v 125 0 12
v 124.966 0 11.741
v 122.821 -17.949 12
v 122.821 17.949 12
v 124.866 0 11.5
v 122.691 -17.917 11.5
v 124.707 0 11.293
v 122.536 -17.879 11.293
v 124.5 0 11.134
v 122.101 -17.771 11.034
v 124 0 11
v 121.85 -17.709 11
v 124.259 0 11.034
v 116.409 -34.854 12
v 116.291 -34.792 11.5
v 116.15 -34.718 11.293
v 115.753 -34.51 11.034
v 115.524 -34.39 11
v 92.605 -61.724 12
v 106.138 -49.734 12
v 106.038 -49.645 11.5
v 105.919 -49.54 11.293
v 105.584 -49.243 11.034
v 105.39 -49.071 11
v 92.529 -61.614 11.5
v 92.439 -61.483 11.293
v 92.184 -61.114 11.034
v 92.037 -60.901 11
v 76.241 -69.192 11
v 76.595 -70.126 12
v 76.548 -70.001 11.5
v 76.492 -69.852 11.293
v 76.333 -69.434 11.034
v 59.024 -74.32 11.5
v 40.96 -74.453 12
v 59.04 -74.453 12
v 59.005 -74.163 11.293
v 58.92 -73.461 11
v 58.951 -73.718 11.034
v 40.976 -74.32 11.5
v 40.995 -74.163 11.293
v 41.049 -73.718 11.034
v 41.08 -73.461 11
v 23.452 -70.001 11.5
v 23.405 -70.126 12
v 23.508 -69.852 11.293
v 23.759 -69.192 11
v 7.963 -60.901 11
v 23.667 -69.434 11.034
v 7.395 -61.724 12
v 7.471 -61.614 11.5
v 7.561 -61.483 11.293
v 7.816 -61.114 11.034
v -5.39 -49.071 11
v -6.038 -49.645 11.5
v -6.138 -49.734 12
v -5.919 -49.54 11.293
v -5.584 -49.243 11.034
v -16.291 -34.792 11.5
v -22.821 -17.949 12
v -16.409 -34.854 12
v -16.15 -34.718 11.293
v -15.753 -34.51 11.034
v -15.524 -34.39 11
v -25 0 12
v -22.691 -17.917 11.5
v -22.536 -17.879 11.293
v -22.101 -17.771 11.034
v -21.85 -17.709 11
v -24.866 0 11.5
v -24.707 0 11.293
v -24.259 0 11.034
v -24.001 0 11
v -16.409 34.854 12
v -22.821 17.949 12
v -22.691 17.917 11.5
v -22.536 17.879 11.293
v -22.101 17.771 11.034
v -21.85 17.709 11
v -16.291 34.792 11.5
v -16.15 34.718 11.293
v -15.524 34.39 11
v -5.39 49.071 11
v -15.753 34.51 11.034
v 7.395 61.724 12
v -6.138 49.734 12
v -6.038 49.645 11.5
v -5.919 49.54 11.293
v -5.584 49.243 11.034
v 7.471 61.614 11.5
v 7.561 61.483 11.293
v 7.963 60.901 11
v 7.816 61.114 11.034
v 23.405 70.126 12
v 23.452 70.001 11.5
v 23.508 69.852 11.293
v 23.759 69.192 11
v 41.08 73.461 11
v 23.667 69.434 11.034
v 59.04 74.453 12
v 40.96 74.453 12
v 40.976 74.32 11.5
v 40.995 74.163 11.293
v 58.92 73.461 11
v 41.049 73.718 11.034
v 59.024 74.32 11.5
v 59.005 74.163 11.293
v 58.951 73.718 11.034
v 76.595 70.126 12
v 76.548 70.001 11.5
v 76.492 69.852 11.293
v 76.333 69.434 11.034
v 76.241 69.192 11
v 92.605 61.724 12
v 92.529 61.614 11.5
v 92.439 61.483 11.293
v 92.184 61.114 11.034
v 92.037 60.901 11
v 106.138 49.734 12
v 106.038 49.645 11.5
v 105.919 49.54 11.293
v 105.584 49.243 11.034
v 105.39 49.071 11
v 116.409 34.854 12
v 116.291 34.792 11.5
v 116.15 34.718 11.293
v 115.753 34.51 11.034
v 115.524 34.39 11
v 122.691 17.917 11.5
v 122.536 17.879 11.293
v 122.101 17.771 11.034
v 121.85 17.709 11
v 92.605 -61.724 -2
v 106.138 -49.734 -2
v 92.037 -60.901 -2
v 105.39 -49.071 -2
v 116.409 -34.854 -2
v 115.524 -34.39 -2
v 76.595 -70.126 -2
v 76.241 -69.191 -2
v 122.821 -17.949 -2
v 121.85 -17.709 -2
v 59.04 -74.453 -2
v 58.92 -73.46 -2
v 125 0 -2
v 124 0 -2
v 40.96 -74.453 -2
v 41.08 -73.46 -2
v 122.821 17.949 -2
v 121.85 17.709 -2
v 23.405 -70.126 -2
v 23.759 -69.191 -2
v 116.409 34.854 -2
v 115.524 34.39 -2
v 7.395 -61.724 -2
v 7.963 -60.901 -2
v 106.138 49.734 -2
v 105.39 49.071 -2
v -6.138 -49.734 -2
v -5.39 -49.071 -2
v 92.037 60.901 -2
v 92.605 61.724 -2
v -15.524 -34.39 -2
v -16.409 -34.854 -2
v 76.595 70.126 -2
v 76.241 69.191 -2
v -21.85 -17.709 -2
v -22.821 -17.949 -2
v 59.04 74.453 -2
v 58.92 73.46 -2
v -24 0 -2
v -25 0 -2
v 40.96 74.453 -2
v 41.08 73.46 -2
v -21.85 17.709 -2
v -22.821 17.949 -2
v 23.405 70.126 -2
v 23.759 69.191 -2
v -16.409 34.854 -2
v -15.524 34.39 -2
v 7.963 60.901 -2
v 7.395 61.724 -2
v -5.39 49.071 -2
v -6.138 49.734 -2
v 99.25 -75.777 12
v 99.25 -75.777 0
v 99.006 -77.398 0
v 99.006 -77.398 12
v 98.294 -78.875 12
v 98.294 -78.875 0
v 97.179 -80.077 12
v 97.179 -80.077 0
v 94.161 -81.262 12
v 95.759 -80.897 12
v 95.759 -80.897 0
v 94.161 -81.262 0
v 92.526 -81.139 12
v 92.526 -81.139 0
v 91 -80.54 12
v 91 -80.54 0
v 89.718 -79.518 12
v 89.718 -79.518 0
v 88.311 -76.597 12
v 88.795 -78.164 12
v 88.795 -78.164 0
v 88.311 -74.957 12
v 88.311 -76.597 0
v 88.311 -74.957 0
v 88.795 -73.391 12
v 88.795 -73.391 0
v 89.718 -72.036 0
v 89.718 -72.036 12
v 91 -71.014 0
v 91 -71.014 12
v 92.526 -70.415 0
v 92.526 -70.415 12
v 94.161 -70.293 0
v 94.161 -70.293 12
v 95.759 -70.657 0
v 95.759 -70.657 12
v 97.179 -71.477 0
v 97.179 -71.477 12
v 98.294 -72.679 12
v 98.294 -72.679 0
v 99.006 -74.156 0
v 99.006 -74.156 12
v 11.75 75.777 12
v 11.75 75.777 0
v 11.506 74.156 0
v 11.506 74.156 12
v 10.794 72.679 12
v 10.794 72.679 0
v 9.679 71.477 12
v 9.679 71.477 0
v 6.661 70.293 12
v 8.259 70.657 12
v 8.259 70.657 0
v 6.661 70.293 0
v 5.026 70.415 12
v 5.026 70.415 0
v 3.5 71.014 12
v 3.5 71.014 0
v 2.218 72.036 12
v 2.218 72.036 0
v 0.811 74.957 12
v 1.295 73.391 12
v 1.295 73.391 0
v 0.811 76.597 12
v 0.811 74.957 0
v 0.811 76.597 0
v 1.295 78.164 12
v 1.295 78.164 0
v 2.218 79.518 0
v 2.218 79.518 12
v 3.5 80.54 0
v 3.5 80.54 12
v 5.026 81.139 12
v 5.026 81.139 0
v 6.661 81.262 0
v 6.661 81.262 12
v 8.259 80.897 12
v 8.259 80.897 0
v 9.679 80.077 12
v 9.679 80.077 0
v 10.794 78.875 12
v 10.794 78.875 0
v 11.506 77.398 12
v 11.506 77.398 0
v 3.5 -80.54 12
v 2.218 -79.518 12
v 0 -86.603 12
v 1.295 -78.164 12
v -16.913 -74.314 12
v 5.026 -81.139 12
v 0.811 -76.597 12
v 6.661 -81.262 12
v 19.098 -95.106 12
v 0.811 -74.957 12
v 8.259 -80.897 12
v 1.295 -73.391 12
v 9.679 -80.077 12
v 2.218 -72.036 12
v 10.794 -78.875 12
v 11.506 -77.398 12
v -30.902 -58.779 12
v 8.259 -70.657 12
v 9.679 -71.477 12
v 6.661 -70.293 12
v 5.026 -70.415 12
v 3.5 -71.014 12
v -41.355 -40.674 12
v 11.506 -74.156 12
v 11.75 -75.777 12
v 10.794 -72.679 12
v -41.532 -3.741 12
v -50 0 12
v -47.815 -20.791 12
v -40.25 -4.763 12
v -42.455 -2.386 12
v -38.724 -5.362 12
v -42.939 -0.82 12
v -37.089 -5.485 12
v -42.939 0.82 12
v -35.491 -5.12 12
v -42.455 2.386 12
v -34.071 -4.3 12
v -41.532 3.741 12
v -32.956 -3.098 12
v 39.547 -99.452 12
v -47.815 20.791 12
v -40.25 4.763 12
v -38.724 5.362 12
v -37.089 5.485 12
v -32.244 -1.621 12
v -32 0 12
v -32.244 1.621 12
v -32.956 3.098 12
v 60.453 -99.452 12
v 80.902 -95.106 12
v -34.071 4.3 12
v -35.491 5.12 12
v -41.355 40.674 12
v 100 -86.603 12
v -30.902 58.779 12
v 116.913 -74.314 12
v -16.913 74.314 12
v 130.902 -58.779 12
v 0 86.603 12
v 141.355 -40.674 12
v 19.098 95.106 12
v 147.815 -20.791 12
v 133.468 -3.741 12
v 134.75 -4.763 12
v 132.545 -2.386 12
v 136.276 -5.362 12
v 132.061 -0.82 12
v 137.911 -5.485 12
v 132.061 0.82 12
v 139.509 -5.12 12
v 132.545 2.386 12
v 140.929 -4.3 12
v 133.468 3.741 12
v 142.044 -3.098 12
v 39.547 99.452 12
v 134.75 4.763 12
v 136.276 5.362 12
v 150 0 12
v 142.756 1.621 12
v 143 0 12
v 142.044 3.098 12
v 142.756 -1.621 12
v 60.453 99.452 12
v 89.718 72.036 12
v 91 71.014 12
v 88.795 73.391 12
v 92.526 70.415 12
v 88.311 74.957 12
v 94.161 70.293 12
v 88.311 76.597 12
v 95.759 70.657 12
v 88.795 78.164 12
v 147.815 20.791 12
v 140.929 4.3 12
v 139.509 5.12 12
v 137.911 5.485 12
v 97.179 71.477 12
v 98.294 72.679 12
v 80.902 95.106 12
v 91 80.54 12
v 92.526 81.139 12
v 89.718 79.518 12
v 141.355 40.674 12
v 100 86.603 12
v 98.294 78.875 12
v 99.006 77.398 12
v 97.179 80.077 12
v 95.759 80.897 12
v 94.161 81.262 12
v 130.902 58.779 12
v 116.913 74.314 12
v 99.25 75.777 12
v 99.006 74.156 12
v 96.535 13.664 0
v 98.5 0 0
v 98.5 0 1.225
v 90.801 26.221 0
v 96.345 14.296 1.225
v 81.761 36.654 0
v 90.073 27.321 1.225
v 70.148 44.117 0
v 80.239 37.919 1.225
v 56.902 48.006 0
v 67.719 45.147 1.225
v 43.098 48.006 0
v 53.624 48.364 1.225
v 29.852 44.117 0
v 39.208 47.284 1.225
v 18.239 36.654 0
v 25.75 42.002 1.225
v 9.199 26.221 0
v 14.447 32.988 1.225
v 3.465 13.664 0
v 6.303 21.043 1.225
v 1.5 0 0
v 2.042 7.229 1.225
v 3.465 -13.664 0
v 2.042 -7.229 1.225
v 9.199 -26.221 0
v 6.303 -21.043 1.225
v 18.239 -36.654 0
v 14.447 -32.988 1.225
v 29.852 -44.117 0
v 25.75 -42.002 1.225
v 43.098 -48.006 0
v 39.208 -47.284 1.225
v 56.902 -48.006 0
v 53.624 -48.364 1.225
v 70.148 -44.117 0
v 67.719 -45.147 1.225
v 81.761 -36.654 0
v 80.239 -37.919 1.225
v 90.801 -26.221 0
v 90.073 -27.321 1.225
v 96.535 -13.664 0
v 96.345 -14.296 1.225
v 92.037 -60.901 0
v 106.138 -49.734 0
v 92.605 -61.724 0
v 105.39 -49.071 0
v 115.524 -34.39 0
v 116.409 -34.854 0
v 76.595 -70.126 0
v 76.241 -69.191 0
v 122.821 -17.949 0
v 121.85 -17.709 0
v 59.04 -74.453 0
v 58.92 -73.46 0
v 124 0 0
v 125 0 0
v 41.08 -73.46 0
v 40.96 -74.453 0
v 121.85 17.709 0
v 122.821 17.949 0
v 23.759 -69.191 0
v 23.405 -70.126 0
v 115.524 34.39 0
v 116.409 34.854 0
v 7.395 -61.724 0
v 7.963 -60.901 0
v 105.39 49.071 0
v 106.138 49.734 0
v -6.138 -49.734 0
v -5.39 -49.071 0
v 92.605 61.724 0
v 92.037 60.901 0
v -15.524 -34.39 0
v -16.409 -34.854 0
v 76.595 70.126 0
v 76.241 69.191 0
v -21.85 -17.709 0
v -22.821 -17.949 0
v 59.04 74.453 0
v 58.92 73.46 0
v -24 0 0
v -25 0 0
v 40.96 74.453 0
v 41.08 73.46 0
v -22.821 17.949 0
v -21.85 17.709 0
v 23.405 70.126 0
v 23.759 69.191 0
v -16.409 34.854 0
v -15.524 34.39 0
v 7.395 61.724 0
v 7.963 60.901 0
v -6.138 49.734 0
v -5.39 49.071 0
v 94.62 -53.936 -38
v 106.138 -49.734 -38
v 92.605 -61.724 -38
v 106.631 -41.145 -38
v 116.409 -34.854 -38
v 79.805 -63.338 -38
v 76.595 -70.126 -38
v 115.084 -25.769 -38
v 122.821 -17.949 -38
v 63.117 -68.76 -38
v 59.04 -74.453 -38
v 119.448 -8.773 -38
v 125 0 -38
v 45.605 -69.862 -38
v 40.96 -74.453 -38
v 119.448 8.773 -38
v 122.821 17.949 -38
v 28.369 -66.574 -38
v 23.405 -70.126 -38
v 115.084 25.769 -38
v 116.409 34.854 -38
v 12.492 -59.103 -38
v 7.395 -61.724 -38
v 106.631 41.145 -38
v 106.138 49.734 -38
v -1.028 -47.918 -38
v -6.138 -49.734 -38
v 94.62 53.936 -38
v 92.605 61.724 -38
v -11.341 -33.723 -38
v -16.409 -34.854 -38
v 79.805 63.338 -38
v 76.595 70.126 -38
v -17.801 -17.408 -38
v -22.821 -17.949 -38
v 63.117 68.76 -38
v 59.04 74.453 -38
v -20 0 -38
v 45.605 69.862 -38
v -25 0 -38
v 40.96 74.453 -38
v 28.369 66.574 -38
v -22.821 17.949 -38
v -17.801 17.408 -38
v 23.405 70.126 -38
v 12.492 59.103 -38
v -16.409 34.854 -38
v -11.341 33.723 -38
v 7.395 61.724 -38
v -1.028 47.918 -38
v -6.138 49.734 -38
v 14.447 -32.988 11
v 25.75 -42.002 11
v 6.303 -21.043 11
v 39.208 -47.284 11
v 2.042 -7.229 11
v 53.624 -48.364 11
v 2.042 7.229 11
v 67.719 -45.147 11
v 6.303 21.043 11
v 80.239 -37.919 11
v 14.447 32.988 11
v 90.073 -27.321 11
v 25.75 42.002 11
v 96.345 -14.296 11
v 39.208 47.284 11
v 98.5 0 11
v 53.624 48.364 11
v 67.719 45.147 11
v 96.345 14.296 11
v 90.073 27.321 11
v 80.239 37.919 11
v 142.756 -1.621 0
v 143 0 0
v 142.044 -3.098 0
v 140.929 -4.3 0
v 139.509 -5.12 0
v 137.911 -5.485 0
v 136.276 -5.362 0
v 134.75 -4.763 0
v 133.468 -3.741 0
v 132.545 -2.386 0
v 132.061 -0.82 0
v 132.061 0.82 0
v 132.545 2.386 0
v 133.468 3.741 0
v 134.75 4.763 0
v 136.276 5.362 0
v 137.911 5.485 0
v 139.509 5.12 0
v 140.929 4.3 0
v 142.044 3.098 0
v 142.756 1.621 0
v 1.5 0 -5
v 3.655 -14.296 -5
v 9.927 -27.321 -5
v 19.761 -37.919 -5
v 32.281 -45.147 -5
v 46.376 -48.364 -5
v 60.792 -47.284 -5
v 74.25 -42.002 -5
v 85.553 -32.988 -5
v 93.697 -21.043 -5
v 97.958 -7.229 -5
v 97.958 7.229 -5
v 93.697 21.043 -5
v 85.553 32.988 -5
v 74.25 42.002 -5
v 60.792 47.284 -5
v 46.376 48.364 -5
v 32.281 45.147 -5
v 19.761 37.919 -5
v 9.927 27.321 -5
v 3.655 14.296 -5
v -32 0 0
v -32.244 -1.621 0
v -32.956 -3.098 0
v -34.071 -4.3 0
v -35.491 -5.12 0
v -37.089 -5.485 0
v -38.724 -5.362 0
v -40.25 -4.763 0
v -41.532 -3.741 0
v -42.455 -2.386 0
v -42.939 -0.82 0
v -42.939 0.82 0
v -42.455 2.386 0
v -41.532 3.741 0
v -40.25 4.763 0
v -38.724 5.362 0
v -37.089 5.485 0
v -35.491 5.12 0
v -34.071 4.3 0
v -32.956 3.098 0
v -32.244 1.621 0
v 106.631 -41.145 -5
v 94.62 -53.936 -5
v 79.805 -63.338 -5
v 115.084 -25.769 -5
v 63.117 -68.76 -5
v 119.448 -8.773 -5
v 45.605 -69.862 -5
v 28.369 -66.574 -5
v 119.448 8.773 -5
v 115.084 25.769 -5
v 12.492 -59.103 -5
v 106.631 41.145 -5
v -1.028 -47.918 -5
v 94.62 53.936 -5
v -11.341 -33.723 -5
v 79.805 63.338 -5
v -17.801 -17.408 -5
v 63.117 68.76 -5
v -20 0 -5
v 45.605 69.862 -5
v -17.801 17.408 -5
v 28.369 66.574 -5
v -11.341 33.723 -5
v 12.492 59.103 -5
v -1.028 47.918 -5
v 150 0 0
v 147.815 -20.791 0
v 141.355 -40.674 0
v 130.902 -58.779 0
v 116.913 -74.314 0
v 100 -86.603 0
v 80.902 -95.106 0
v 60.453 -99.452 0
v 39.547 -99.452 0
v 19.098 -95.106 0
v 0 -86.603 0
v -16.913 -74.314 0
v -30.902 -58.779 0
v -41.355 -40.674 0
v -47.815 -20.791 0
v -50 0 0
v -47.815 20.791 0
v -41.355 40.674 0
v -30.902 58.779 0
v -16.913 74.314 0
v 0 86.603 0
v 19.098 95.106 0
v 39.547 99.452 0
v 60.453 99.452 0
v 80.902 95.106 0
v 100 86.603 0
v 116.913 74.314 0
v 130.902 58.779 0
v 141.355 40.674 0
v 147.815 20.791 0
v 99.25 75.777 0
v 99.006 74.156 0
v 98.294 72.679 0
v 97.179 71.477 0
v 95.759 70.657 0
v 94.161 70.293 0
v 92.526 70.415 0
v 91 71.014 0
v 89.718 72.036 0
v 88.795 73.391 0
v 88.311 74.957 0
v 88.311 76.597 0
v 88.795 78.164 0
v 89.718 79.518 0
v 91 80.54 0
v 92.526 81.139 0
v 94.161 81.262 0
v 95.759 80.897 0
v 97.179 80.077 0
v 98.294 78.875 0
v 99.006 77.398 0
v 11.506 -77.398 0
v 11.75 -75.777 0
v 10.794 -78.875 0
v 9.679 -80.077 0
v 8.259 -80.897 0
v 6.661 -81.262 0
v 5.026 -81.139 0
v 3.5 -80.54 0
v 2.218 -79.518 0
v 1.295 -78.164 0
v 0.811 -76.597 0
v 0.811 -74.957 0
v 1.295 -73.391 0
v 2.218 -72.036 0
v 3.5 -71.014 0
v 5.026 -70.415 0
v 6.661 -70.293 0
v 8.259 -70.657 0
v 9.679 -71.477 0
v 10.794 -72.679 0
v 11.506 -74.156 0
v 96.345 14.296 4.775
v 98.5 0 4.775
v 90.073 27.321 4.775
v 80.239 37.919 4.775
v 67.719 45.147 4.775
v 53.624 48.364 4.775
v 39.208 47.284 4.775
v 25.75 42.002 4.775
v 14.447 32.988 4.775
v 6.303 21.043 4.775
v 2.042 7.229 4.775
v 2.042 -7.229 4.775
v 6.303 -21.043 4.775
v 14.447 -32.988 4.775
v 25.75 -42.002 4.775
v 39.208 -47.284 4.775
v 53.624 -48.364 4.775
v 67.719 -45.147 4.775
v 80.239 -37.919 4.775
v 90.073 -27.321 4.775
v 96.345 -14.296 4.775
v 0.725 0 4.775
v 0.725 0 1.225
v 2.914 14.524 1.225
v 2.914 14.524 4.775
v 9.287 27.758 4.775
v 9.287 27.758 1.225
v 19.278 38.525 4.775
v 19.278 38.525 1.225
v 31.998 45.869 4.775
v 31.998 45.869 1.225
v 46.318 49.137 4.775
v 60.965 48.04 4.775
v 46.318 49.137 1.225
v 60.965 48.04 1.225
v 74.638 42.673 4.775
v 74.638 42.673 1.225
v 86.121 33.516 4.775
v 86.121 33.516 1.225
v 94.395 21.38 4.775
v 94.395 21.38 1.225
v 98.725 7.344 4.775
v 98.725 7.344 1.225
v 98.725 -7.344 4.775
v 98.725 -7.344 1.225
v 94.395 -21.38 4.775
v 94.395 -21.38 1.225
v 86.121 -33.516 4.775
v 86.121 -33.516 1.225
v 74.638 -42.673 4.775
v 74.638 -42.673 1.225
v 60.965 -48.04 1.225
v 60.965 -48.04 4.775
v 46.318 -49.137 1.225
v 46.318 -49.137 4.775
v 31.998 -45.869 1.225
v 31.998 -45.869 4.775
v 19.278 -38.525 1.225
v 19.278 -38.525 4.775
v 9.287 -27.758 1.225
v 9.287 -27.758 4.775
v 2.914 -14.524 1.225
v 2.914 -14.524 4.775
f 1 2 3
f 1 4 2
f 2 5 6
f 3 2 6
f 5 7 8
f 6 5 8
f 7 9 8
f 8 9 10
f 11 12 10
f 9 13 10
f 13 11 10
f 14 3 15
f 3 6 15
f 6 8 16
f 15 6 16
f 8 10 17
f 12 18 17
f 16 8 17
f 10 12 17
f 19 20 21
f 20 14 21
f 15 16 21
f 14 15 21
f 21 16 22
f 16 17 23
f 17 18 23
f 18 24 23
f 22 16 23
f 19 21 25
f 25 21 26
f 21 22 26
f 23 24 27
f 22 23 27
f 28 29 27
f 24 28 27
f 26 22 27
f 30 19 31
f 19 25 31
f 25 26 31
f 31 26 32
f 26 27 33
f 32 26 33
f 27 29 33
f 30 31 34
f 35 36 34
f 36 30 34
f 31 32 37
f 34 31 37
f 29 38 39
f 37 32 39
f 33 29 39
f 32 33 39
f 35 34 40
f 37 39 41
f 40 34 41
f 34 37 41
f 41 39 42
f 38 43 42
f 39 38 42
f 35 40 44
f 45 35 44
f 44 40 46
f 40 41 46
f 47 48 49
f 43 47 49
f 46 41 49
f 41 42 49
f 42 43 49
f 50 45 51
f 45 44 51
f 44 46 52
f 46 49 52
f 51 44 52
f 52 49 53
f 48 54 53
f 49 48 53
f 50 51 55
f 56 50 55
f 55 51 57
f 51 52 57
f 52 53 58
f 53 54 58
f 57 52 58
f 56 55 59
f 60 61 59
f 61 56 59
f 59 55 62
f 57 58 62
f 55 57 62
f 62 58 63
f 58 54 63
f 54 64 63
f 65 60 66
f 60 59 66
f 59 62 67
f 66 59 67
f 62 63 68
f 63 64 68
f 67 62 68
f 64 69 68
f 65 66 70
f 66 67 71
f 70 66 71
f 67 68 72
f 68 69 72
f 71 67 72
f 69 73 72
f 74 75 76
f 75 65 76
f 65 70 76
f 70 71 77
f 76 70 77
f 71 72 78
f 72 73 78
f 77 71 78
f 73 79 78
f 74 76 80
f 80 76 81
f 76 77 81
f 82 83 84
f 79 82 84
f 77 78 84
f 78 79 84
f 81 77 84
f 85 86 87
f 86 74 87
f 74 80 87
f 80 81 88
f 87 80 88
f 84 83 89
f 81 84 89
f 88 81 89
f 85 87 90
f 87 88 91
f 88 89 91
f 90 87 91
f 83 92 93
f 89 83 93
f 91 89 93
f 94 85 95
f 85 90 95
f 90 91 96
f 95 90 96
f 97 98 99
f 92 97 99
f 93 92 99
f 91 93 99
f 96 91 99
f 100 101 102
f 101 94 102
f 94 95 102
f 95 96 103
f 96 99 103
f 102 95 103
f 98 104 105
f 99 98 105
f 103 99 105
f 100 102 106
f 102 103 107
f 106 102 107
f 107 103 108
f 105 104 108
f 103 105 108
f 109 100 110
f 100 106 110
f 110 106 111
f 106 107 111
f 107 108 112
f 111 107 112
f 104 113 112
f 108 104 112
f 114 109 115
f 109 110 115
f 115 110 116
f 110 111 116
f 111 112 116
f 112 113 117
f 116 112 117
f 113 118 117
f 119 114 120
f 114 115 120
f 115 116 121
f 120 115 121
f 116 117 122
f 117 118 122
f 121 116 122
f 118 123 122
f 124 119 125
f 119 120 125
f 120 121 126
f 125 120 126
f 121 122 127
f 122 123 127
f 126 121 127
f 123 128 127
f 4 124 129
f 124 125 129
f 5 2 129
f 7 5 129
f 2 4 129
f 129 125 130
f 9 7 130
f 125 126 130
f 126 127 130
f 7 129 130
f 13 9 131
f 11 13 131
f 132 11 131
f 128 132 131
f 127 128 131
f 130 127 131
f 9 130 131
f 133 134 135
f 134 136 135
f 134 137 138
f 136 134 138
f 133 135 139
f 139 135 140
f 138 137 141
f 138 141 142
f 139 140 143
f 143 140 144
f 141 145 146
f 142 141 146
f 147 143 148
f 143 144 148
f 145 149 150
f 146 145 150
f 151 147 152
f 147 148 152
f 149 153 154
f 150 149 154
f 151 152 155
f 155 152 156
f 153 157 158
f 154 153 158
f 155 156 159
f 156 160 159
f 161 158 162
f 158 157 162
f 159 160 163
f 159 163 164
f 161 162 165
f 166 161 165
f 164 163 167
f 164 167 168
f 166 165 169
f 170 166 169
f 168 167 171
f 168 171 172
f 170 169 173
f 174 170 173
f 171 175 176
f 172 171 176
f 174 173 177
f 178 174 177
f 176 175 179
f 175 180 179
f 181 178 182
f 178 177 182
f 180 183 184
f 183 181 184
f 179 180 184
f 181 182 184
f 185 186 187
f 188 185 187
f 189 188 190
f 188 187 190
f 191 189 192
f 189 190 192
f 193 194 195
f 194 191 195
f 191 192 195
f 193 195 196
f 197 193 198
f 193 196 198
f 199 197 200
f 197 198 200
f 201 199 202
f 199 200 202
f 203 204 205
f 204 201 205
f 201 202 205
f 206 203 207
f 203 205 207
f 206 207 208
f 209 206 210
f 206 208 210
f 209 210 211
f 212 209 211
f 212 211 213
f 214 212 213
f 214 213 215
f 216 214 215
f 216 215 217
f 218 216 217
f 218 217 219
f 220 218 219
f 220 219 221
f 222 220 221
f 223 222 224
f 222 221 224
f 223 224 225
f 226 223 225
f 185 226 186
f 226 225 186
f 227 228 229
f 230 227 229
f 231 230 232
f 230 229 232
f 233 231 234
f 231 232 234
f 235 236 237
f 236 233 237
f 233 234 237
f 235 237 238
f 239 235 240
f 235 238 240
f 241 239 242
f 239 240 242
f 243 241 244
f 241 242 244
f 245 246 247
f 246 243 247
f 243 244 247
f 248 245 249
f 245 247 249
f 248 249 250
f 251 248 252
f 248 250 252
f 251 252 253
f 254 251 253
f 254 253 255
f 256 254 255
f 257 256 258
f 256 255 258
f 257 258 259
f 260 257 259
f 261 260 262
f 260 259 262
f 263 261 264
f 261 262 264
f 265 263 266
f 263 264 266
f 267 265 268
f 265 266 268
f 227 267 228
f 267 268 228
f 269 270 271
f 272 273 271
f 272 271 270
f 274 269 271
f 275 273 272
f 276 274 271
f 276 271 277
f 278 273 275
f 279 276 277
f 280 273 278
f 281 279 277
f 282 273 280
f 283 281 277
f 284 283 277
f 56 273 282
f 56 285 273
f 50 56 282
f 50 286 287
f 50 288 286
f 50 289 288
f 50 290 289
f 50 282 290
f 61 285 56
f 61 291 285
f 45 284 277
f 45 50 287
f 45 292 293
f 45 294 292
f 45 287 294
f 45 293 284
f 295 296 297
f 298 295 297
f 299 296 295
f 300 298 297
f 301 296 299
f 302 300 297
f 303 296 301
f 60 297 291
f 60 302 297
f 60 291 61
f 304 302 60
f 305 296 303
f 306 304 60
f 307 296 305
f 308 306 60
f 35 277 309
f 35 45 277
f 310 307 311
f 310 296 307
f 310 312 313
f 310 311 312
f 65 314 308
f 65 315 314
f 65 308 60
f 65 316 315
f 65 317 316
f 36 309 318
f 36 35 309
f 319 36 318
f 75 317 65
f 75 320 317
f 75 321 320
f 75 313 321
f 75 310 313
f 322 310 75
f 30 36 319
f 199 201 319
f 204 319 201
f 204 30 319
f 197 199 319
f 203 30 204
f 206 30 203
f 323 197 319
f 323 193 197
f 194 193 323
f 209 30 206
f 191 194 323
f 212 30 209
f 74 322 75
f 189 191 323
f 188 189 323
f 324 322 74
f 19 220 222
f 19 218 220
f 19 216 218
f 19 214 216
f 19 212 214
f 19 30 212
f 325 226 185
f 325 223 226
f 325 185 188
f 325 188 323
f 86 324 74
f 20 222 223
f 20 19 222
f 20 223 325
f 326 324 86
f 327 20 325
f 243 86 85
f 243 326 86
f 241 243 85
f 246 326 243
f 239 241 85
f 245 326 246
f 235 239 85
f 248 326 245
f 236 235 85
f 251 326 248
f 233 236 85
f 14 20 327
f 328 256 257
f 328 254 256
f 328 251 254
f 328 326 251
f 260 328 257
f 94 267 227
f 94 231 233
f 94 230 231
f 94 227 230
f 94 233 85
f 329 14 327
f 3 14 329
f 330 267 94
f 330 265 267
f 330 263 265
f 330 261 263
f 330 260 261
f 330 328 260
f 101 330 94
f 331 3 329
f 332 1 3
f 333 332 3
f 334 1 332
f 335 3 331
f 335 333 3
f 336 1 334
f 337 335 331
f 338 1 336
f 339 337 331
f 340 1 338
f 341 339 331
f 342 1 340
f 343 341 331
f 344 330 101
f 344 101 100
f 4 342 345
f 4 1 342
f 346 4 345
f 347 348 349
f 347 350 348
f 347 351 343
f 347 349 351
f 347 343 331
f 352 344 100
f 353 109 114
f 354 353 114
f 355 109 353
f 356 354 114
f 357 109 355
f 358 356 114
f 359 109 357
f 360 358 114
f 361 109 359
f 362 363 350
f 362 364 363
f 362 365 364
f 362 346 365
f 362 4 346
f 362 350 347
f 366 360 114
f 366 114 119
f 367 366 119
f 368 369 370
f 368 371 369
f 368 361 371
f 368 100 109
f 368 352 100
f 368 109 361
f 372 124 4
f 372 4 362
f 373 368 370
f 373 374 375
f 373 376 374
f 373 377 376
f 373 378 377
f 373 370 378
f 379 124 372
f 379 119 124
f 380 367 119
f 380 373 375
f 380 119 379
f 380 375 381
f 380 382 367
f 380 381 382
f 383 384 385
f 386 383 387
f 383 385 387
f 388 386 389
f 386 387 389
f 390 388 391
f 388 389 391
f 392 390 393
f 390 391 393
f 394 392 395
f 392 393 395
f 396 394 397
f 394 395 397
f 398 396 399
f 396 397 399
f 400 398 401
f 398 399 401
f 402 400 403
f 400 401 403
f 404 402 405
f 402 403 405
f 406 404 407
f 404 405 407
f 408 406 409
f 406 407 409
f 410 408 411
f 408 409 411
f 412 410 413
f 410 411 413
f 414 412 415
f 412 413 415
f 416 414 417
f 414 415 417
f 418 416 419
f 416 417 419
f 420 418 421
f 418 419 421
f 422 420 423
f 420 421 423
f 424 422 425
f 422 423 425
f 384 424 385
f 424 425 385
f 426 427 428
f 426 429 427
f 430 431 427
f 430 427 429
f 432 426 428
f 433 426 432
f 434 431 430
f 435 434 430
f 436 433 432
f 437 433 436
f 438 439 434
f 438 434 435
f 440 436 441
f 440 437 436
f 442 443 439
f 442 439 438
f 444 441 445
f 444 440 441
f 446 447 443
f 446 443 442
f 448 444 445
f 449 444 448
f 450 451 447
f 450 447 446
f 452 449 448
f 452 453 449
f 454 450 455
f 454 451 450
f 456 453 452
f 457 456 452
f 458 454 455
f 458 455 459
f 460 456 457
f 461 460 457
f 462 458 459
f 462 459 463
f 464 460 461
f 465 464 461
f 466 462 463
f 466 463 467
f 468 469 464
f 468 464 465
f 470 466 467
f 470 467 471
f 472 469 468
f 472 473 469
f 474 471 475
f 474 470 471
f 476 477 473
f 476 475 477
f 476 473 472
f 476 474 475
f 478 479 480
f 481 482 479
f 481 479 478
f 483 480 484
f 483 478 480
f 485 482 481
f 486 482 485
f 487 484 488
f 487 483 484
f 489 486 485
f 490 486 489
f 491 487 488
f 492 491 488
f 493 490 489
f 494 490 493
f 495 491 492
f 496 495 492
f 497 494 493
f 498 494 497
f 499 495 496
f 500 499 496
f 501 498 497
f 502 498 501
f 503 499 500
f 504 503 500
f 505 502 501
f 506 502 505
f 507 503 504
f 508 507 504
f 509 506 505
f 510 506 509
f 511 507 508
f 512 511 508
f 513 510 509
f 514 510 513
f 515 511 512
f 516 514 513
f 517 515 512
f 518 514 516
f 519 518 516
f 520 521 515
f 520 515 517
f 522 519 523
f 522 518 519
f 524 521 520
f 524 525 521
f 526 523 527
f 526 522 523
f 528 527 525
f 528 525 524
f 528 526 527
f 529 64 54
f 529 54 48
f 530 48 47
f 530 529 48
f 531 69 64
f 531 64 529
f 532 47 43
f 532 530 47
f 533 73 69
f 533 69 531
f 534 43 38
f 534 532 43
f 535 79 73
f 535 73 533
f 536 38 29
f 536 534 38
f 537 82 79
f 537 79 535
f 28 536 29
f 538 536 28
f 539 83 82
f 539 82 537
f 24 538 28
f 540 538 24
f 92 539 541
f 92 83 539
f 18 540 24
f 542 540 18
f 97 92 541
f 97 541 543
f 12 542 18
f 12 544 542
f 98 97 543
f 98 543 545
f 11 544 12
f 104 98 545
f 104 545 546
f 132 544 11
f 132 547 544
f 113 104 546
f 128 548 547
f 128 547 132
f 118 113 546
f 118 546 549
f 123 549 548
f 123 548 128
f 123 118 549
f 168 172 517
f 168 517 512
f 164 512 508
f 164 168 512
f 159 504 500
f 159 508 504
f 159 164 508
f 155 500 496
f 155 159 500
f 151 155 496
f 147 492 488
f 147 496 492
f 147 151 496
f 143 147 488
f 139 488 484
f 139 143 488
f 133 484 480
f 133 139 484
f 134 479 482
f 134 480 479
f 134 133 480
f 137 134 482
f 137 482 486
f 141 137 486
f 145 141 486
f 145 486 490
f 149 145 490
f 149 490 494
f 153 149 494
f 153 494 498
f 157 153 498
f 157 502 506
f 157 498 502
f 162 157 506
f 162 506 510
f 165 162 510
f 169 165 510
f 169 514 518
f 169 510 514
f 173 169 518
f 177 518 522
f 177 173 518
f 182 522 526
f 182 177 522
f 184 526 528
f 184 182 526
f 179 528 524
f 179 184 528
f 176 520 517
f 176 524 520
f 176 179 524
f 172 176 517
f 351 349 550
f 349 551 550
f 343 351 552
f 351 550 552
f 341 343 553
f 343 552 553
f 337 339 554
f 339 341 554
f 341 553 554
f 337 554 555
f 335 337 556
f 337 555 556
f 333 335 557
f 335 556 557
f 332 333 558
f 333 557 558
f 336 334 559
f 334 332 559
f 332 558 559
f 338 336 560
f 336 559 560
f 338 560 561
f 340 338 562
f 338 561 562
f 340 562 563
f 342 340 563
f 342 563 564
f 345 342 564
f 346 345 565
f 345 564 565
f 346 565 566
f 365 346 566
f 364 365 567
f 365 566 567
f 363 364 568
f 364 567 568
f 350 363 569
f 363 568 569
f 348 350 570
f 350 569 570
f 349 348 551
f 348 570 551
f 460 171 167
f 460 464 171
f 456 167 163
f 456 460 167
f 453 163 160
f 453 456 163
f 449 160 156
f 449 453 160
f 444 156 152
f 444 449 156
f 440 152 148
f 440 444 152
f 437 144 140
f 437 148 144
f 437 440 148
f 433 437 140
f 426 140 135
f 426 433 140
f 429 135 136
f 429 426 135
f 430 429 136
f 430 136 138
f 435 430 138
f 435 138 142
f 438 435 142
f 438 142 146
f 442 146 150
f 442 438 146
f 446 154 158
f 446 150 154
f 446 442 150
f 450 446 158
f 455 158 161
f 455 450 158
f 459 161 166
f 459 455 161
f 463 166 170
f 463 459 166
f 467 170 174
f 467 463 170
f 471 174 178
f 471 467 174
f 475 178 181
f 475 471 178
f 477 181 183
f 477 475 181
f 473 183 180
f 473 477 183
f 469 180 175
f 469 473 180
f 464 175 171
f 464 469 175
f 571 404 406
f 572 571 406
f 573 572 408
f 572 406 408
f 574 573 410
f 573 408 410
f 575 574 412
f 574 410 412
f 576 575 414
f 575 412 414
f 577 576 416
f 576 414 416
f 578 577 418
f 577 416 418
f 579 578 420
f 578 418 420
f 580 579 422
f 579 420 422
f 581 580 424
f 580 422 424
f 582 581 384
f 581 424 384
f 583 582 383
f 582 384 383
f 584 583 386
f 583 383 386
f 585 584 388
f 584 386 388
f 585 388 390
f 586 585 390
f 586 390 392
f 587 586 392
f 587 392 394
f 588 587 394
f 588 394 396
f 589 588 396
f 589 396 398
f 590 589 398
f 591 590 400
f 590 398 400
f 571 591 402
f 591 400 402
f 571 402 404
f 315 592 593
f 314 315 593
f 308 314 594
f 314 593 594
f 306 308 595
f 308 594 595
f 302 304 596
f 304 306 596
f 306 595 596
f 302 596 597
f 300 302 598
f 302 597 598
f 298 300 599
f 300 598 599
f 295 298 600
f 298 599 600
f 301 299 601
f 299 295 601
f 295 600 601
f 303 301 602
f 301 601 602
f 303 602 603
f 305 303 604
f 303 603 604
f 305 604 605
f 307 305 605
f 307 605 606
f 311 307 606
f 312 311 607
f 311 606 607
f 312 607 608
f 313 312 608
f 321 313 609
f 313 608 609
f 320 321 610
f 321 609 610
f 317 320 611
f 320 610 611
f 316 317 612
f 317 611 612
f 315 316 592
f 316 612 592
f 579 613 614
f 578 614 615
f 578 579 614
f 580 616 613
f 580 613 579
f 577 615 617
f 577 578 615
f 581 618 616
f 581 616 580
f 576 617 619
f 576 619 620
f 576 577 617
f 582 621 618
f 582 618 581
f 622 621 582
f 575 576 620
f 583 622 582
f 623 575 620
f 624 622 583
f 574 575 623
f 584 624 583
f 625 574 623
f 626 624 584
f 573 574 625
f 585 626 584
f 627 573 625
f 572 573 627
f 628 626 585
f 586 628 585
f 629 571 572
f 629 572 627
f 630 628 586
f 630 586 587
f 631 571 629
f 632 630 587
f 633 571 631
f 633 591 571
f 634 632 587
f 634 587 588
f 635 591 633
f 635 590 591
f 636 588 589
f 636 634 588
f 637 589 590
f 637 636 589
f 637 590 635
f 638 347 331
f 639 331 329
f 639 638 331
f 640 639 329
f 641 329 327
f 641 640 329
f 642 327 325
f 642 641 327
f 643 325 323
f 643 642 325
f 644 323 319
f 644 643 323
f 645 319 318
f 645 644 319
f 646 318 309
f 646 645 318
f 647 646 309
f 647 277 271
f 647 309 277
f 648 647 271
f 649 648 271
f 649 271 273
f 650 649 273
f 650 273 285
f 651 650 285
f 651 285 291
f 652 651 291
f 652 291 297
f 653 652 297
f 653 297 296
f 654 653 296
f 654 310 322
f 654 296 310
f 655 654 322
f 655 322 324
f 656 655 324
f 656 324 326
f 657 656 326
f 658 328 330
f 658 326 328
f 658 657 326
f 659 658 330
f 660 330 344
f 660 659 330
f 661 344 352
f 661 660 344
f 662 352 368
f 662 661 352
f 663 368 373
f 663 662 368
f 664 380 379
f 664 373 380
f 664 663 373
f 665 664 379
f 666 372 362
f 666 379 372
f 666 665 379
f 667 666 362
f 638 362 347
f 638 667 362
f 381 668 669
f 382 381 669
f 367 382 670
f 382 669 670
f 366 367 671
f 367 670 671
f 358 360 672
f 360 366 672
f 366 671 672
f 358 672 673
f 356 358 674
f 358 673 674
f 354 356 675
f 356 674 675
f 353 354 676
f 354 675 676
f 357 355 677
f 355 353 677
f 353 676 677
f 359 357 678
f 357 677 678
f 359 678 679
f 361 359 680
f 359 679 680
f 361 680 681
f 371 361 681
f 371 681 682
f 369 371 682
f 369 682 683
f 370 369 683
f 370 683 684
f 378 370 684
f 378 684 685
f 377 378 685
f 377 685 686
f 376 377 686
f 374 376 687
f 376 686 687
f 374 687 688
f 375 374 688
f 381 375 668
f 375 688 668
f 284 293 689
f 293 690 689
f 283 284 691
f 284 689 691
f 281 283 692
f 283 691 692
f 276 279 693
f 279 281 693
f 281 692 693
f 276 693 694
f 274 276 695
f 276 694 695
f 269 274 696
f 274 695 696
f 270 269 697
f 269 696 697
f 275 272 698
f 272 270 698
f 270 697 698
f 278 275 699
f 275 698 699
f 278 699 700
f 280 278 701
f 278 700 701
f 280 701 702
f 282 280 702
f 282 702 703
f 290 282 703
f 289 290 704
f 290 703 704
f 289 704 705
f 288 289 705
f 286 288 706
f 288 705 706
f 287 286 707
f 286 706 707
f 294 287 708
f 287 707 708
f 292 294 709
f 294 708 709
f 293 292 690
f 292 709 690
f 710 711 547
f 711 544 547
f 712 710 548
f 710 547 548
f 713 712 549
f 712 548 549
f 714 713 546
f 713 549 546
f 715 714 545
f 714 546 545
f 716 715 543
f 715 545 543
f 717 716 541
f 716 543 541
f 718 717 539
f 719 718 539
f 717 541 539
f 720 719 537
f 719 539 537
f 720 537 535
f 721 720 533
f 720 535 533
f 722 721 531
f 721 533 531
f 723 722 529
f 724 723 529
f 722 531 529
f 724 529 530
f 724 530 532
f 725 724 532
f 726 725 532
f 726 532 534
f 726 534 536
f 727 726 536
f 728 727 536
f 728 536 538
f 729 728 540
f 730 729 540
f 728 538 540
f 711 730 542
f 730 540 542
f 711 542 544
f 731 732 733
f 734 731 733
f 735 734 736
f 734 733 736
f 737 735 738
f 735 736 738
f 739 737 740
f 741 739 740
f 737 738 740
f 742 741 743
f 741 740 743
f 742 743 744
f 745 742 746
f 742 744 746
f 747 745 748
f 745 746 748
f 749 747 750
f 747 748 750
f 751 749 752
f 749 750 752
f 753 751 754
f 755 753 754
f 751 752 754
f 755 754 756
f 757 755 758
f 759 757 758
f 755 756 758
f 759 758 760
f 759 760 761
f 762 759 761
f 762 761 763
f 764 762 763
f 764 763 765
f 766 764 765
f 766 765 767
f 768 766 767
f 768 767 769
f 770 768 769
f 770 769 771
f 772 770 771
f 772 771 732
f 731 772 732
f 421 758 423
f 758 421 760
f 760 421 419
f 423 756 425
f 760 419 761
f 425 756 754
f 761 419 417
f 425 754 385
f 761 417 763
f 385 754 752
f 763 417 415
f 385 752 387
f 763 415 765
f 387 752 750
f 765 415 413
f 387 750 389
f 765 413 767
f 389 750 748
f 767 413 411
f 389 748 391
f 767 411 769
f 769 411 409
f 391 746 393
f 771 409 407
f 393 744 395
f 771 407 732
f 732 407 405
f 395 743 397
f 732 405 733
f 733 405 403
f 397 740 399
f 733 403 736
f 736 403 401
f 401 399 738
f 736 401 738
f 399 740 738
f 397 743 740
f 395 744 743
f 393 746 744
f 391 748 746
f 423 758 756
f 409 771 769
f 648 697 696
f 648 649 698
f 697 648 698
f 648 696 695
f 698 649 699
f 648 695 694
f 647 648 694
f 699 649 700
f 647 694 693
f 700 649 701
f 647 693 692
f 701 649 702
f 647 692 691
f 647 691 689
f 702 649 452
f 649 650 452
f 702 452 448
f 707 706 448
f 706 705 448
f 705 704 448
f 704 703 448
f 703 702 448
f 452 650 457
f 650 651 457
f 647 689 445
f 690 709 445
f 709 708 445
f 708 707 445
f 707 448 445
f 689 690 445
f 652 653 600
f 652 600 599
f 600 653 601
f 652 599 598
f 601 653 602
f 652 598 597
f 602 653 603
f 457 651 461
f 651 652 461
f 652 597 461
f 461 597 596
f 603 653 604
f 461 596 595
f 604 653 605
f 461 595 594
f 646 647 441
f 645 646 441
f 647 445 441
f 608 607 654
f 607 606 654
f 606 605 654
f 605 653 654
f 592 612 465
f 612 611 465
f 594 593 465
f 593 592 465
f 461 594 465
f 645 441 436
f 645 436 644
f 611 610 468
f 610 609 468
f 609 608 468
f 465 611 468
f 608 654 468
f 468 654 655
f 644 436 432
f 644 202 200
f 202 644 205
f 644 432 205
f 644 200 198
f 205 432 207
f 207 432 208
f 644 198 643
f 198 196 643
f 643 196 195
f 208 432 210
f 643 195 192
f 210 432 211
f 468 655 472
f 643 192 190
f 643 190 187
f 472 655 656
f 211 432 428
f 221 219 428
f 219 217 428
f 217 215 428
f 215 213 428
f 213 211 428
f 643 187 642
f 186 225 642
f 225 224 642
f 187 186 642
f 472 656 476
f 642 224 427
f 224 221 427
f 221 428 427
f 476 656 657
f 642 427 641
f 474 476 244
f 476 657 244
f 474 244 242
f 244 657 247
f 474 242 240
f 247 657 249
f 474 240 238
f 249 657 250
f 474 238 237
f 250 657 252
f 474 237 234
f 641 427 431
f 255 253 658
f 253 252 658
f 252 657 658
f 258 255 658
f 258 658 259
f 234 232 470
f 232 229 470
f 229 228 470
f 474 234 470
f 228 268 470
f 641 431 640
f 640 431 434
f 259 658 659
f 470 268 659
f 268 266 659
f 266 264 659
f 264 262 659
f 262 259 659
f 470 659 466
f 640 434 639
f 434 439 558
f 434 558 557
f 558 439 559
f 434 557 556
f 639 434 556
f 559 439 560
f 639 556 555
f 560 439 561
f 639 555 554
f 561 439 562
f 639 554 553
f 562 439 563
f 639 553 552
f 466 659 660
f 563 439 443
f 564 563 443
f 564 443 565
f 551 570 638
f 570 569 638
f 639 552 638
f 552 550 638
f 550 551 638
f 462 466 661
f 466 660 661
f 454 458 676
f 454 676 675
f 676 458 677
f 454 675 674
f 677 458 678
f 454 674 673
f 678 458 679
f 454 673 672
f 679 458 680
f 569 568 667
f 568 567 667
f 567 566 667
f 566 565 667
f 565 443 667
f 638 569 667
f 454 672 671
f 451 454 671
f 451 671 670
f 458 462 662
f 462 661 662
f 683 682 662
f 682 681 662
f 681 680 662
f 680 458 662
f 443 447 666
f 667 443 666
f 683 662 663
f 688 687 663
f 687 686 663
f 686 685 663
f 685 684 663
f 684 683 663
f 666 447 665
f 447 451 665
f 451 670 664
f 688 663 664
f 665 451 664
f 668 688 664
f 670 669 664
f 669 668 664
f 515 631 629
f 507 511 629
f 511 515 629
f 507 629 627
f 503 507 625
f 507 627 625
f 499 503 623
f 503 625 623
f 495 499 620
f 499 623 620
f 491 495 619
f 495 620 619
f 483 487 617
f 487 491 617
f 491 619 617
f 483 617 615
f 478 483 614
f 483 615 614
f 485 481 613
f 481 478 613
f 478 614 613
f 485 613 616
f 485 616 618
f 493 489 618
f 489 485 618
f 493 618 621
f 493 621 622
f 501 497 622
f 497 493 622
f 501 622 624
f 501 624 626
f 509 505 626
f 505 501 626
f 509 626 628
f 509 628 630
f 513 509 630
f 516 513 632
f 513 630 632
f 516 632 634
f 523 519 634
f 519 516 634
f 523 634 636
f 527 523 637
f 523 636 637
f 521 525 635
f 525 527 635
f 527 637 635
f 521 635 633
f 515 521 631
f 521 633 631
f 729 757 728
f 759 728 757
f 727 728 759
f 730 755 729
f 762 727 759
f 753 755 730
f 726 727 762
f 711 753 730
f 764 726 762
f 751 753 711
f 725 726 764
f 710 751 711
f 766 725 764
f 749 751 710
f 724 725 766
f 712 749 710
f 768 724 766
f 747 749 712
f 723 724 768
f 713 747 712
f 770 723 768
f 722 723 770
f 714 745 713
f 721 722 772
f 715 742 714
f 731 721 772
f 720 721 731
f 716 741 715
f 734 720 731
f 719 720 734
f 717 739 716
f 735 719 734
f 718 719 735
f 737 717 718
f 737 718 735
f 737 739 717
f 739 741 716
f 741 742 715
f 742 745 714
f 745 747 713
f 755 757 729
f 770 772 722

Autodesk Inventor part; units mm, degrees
ref_plane "YZ Plane" through (0, 0, 0) normal (1, 0, 0) x (0, 1, 0)
ref_plane "工作平面1" through (0, 0, 0) normal (0, 0, 1) x (1, 0, 0)
sketch "草图1" plane through (0, 0, 0) normal (0, 0, 1) x (1, 0, 0)
  arc A0 (50, 75) -> (50, -75) centre (50, 0) ccw construction
  line L0 (50, 75) -> (50, 100) construction
  arc A1 (50, 100) -> (50, -100) centre (50, 0) ccw construction
  line L1 (50, -100) -> (50, -75) construction
  circle A2 centre (50, 0) radius 100
  circle A3 centre (50, 0) radius 87.5 construction
  line L2 (190.8101, 0) -> (-90.8101, 0) construction
  circle A4 centre (137.5, 0) radius 5.5
  circle A5 centre (93.75, 75.7772) radius 5.5
  circle A6 centre (6.25, 75.7772) radius 5.5
  circle A7 centre (-37.5, 0) radius 5.5
  circle A8 centre (6.25, -75.7772) radius 5.5
  circle A9 centre (93.75, -75.7772) radius 5.5
  point P0 (0, 0)
  dimension "d0" = 175
  dimension "d1" = 11
  dimension "d4" = 360
extrude "拉伸1" add sketch "草图1" along normal blind 12
sketch "草图2" plane through (50, 0, 12) normal (0, 0, 1) x (1, 0, 0)
  circle A0 centre (0, 0) radius 48 construction
  circle A1 centre (0, 0) radius 48.5
  point P0 (-50, 0)
  dimension "d19" = 97
extrude "拉伸2" cut sketch "草图2" against normal up to surface (12 mm away)
sketch "草图3" plane through (50, 0, 0) normal (0, 0, -1) x (-1, 0, 0)
  circle A0 centre (0, 0) radius 100 projected
  circle A1 centre (0, 0) radius 75
  circle A2 centre (0, 0) radius 70
  point P0 (50, 0)
  dimension "d11" = 150
  dimension "d12" = 140
extrude "拉伸3" add sketch "草图3" along normal blind 38 contours A1
sketch "草图4" plane through (50, 0, 12) normal (0, 0, 1) x (1, 0, 0)
  circle A0 centre (0, 0) radius 48.5 construction
  circle A1 centre (0, 0) radius 75
  point P0 (-50, 0)
  dimension "d15" = 150
extrude "拉伸4" cut sketch "草图4" against normal blind 1
fillet "圆角1" radius 1 1 edges at (-25, 0, 11)
sketch "草图5" plane through (50, 0, 0) normal (0, 0, -1) x (-1, 0, 0)
  circle A0 centre (0, 0) radius 70 projected
  circle A1 centre (0, 0) radius 48.5 projected
  point P0 (50, 0)
extrude "拉伸5" add sketch "草图5" along normal blind 5
ref_plane "工作平面2" through (50, 0, 3) normal (0, 0, -1) x (-1, 0, 0)
sketch "草图6" plane through (50, 0, 3) normal (0, 0, -1) x (-1, 0, 0)
  circle A0 centre (0, 0) radius 48.5 construction
  circle A1 centre (0, 0) radius 49.275
  point P0 (50, 0)
  dimension "d22" = 98.55
extrude "拉伸6" cut sketch "草图6" against normal mid plane 3.55
sketch "草图7" plane through (50, 0, 0) normal (0, 0, -1) x (-1, 0, 0)
  circle A0 centre (0, 0) radius 48.5 construction
  circle A1 centre (0, 0) radius 75 projected
  circle A2 centre (0, 0) radius 74
  point P0 (50, 0)
  dimension "d25" = 1
extrude "拉伸7" cut sketch "草图7" along normal blind 2
properties part number "轴承通盖"
